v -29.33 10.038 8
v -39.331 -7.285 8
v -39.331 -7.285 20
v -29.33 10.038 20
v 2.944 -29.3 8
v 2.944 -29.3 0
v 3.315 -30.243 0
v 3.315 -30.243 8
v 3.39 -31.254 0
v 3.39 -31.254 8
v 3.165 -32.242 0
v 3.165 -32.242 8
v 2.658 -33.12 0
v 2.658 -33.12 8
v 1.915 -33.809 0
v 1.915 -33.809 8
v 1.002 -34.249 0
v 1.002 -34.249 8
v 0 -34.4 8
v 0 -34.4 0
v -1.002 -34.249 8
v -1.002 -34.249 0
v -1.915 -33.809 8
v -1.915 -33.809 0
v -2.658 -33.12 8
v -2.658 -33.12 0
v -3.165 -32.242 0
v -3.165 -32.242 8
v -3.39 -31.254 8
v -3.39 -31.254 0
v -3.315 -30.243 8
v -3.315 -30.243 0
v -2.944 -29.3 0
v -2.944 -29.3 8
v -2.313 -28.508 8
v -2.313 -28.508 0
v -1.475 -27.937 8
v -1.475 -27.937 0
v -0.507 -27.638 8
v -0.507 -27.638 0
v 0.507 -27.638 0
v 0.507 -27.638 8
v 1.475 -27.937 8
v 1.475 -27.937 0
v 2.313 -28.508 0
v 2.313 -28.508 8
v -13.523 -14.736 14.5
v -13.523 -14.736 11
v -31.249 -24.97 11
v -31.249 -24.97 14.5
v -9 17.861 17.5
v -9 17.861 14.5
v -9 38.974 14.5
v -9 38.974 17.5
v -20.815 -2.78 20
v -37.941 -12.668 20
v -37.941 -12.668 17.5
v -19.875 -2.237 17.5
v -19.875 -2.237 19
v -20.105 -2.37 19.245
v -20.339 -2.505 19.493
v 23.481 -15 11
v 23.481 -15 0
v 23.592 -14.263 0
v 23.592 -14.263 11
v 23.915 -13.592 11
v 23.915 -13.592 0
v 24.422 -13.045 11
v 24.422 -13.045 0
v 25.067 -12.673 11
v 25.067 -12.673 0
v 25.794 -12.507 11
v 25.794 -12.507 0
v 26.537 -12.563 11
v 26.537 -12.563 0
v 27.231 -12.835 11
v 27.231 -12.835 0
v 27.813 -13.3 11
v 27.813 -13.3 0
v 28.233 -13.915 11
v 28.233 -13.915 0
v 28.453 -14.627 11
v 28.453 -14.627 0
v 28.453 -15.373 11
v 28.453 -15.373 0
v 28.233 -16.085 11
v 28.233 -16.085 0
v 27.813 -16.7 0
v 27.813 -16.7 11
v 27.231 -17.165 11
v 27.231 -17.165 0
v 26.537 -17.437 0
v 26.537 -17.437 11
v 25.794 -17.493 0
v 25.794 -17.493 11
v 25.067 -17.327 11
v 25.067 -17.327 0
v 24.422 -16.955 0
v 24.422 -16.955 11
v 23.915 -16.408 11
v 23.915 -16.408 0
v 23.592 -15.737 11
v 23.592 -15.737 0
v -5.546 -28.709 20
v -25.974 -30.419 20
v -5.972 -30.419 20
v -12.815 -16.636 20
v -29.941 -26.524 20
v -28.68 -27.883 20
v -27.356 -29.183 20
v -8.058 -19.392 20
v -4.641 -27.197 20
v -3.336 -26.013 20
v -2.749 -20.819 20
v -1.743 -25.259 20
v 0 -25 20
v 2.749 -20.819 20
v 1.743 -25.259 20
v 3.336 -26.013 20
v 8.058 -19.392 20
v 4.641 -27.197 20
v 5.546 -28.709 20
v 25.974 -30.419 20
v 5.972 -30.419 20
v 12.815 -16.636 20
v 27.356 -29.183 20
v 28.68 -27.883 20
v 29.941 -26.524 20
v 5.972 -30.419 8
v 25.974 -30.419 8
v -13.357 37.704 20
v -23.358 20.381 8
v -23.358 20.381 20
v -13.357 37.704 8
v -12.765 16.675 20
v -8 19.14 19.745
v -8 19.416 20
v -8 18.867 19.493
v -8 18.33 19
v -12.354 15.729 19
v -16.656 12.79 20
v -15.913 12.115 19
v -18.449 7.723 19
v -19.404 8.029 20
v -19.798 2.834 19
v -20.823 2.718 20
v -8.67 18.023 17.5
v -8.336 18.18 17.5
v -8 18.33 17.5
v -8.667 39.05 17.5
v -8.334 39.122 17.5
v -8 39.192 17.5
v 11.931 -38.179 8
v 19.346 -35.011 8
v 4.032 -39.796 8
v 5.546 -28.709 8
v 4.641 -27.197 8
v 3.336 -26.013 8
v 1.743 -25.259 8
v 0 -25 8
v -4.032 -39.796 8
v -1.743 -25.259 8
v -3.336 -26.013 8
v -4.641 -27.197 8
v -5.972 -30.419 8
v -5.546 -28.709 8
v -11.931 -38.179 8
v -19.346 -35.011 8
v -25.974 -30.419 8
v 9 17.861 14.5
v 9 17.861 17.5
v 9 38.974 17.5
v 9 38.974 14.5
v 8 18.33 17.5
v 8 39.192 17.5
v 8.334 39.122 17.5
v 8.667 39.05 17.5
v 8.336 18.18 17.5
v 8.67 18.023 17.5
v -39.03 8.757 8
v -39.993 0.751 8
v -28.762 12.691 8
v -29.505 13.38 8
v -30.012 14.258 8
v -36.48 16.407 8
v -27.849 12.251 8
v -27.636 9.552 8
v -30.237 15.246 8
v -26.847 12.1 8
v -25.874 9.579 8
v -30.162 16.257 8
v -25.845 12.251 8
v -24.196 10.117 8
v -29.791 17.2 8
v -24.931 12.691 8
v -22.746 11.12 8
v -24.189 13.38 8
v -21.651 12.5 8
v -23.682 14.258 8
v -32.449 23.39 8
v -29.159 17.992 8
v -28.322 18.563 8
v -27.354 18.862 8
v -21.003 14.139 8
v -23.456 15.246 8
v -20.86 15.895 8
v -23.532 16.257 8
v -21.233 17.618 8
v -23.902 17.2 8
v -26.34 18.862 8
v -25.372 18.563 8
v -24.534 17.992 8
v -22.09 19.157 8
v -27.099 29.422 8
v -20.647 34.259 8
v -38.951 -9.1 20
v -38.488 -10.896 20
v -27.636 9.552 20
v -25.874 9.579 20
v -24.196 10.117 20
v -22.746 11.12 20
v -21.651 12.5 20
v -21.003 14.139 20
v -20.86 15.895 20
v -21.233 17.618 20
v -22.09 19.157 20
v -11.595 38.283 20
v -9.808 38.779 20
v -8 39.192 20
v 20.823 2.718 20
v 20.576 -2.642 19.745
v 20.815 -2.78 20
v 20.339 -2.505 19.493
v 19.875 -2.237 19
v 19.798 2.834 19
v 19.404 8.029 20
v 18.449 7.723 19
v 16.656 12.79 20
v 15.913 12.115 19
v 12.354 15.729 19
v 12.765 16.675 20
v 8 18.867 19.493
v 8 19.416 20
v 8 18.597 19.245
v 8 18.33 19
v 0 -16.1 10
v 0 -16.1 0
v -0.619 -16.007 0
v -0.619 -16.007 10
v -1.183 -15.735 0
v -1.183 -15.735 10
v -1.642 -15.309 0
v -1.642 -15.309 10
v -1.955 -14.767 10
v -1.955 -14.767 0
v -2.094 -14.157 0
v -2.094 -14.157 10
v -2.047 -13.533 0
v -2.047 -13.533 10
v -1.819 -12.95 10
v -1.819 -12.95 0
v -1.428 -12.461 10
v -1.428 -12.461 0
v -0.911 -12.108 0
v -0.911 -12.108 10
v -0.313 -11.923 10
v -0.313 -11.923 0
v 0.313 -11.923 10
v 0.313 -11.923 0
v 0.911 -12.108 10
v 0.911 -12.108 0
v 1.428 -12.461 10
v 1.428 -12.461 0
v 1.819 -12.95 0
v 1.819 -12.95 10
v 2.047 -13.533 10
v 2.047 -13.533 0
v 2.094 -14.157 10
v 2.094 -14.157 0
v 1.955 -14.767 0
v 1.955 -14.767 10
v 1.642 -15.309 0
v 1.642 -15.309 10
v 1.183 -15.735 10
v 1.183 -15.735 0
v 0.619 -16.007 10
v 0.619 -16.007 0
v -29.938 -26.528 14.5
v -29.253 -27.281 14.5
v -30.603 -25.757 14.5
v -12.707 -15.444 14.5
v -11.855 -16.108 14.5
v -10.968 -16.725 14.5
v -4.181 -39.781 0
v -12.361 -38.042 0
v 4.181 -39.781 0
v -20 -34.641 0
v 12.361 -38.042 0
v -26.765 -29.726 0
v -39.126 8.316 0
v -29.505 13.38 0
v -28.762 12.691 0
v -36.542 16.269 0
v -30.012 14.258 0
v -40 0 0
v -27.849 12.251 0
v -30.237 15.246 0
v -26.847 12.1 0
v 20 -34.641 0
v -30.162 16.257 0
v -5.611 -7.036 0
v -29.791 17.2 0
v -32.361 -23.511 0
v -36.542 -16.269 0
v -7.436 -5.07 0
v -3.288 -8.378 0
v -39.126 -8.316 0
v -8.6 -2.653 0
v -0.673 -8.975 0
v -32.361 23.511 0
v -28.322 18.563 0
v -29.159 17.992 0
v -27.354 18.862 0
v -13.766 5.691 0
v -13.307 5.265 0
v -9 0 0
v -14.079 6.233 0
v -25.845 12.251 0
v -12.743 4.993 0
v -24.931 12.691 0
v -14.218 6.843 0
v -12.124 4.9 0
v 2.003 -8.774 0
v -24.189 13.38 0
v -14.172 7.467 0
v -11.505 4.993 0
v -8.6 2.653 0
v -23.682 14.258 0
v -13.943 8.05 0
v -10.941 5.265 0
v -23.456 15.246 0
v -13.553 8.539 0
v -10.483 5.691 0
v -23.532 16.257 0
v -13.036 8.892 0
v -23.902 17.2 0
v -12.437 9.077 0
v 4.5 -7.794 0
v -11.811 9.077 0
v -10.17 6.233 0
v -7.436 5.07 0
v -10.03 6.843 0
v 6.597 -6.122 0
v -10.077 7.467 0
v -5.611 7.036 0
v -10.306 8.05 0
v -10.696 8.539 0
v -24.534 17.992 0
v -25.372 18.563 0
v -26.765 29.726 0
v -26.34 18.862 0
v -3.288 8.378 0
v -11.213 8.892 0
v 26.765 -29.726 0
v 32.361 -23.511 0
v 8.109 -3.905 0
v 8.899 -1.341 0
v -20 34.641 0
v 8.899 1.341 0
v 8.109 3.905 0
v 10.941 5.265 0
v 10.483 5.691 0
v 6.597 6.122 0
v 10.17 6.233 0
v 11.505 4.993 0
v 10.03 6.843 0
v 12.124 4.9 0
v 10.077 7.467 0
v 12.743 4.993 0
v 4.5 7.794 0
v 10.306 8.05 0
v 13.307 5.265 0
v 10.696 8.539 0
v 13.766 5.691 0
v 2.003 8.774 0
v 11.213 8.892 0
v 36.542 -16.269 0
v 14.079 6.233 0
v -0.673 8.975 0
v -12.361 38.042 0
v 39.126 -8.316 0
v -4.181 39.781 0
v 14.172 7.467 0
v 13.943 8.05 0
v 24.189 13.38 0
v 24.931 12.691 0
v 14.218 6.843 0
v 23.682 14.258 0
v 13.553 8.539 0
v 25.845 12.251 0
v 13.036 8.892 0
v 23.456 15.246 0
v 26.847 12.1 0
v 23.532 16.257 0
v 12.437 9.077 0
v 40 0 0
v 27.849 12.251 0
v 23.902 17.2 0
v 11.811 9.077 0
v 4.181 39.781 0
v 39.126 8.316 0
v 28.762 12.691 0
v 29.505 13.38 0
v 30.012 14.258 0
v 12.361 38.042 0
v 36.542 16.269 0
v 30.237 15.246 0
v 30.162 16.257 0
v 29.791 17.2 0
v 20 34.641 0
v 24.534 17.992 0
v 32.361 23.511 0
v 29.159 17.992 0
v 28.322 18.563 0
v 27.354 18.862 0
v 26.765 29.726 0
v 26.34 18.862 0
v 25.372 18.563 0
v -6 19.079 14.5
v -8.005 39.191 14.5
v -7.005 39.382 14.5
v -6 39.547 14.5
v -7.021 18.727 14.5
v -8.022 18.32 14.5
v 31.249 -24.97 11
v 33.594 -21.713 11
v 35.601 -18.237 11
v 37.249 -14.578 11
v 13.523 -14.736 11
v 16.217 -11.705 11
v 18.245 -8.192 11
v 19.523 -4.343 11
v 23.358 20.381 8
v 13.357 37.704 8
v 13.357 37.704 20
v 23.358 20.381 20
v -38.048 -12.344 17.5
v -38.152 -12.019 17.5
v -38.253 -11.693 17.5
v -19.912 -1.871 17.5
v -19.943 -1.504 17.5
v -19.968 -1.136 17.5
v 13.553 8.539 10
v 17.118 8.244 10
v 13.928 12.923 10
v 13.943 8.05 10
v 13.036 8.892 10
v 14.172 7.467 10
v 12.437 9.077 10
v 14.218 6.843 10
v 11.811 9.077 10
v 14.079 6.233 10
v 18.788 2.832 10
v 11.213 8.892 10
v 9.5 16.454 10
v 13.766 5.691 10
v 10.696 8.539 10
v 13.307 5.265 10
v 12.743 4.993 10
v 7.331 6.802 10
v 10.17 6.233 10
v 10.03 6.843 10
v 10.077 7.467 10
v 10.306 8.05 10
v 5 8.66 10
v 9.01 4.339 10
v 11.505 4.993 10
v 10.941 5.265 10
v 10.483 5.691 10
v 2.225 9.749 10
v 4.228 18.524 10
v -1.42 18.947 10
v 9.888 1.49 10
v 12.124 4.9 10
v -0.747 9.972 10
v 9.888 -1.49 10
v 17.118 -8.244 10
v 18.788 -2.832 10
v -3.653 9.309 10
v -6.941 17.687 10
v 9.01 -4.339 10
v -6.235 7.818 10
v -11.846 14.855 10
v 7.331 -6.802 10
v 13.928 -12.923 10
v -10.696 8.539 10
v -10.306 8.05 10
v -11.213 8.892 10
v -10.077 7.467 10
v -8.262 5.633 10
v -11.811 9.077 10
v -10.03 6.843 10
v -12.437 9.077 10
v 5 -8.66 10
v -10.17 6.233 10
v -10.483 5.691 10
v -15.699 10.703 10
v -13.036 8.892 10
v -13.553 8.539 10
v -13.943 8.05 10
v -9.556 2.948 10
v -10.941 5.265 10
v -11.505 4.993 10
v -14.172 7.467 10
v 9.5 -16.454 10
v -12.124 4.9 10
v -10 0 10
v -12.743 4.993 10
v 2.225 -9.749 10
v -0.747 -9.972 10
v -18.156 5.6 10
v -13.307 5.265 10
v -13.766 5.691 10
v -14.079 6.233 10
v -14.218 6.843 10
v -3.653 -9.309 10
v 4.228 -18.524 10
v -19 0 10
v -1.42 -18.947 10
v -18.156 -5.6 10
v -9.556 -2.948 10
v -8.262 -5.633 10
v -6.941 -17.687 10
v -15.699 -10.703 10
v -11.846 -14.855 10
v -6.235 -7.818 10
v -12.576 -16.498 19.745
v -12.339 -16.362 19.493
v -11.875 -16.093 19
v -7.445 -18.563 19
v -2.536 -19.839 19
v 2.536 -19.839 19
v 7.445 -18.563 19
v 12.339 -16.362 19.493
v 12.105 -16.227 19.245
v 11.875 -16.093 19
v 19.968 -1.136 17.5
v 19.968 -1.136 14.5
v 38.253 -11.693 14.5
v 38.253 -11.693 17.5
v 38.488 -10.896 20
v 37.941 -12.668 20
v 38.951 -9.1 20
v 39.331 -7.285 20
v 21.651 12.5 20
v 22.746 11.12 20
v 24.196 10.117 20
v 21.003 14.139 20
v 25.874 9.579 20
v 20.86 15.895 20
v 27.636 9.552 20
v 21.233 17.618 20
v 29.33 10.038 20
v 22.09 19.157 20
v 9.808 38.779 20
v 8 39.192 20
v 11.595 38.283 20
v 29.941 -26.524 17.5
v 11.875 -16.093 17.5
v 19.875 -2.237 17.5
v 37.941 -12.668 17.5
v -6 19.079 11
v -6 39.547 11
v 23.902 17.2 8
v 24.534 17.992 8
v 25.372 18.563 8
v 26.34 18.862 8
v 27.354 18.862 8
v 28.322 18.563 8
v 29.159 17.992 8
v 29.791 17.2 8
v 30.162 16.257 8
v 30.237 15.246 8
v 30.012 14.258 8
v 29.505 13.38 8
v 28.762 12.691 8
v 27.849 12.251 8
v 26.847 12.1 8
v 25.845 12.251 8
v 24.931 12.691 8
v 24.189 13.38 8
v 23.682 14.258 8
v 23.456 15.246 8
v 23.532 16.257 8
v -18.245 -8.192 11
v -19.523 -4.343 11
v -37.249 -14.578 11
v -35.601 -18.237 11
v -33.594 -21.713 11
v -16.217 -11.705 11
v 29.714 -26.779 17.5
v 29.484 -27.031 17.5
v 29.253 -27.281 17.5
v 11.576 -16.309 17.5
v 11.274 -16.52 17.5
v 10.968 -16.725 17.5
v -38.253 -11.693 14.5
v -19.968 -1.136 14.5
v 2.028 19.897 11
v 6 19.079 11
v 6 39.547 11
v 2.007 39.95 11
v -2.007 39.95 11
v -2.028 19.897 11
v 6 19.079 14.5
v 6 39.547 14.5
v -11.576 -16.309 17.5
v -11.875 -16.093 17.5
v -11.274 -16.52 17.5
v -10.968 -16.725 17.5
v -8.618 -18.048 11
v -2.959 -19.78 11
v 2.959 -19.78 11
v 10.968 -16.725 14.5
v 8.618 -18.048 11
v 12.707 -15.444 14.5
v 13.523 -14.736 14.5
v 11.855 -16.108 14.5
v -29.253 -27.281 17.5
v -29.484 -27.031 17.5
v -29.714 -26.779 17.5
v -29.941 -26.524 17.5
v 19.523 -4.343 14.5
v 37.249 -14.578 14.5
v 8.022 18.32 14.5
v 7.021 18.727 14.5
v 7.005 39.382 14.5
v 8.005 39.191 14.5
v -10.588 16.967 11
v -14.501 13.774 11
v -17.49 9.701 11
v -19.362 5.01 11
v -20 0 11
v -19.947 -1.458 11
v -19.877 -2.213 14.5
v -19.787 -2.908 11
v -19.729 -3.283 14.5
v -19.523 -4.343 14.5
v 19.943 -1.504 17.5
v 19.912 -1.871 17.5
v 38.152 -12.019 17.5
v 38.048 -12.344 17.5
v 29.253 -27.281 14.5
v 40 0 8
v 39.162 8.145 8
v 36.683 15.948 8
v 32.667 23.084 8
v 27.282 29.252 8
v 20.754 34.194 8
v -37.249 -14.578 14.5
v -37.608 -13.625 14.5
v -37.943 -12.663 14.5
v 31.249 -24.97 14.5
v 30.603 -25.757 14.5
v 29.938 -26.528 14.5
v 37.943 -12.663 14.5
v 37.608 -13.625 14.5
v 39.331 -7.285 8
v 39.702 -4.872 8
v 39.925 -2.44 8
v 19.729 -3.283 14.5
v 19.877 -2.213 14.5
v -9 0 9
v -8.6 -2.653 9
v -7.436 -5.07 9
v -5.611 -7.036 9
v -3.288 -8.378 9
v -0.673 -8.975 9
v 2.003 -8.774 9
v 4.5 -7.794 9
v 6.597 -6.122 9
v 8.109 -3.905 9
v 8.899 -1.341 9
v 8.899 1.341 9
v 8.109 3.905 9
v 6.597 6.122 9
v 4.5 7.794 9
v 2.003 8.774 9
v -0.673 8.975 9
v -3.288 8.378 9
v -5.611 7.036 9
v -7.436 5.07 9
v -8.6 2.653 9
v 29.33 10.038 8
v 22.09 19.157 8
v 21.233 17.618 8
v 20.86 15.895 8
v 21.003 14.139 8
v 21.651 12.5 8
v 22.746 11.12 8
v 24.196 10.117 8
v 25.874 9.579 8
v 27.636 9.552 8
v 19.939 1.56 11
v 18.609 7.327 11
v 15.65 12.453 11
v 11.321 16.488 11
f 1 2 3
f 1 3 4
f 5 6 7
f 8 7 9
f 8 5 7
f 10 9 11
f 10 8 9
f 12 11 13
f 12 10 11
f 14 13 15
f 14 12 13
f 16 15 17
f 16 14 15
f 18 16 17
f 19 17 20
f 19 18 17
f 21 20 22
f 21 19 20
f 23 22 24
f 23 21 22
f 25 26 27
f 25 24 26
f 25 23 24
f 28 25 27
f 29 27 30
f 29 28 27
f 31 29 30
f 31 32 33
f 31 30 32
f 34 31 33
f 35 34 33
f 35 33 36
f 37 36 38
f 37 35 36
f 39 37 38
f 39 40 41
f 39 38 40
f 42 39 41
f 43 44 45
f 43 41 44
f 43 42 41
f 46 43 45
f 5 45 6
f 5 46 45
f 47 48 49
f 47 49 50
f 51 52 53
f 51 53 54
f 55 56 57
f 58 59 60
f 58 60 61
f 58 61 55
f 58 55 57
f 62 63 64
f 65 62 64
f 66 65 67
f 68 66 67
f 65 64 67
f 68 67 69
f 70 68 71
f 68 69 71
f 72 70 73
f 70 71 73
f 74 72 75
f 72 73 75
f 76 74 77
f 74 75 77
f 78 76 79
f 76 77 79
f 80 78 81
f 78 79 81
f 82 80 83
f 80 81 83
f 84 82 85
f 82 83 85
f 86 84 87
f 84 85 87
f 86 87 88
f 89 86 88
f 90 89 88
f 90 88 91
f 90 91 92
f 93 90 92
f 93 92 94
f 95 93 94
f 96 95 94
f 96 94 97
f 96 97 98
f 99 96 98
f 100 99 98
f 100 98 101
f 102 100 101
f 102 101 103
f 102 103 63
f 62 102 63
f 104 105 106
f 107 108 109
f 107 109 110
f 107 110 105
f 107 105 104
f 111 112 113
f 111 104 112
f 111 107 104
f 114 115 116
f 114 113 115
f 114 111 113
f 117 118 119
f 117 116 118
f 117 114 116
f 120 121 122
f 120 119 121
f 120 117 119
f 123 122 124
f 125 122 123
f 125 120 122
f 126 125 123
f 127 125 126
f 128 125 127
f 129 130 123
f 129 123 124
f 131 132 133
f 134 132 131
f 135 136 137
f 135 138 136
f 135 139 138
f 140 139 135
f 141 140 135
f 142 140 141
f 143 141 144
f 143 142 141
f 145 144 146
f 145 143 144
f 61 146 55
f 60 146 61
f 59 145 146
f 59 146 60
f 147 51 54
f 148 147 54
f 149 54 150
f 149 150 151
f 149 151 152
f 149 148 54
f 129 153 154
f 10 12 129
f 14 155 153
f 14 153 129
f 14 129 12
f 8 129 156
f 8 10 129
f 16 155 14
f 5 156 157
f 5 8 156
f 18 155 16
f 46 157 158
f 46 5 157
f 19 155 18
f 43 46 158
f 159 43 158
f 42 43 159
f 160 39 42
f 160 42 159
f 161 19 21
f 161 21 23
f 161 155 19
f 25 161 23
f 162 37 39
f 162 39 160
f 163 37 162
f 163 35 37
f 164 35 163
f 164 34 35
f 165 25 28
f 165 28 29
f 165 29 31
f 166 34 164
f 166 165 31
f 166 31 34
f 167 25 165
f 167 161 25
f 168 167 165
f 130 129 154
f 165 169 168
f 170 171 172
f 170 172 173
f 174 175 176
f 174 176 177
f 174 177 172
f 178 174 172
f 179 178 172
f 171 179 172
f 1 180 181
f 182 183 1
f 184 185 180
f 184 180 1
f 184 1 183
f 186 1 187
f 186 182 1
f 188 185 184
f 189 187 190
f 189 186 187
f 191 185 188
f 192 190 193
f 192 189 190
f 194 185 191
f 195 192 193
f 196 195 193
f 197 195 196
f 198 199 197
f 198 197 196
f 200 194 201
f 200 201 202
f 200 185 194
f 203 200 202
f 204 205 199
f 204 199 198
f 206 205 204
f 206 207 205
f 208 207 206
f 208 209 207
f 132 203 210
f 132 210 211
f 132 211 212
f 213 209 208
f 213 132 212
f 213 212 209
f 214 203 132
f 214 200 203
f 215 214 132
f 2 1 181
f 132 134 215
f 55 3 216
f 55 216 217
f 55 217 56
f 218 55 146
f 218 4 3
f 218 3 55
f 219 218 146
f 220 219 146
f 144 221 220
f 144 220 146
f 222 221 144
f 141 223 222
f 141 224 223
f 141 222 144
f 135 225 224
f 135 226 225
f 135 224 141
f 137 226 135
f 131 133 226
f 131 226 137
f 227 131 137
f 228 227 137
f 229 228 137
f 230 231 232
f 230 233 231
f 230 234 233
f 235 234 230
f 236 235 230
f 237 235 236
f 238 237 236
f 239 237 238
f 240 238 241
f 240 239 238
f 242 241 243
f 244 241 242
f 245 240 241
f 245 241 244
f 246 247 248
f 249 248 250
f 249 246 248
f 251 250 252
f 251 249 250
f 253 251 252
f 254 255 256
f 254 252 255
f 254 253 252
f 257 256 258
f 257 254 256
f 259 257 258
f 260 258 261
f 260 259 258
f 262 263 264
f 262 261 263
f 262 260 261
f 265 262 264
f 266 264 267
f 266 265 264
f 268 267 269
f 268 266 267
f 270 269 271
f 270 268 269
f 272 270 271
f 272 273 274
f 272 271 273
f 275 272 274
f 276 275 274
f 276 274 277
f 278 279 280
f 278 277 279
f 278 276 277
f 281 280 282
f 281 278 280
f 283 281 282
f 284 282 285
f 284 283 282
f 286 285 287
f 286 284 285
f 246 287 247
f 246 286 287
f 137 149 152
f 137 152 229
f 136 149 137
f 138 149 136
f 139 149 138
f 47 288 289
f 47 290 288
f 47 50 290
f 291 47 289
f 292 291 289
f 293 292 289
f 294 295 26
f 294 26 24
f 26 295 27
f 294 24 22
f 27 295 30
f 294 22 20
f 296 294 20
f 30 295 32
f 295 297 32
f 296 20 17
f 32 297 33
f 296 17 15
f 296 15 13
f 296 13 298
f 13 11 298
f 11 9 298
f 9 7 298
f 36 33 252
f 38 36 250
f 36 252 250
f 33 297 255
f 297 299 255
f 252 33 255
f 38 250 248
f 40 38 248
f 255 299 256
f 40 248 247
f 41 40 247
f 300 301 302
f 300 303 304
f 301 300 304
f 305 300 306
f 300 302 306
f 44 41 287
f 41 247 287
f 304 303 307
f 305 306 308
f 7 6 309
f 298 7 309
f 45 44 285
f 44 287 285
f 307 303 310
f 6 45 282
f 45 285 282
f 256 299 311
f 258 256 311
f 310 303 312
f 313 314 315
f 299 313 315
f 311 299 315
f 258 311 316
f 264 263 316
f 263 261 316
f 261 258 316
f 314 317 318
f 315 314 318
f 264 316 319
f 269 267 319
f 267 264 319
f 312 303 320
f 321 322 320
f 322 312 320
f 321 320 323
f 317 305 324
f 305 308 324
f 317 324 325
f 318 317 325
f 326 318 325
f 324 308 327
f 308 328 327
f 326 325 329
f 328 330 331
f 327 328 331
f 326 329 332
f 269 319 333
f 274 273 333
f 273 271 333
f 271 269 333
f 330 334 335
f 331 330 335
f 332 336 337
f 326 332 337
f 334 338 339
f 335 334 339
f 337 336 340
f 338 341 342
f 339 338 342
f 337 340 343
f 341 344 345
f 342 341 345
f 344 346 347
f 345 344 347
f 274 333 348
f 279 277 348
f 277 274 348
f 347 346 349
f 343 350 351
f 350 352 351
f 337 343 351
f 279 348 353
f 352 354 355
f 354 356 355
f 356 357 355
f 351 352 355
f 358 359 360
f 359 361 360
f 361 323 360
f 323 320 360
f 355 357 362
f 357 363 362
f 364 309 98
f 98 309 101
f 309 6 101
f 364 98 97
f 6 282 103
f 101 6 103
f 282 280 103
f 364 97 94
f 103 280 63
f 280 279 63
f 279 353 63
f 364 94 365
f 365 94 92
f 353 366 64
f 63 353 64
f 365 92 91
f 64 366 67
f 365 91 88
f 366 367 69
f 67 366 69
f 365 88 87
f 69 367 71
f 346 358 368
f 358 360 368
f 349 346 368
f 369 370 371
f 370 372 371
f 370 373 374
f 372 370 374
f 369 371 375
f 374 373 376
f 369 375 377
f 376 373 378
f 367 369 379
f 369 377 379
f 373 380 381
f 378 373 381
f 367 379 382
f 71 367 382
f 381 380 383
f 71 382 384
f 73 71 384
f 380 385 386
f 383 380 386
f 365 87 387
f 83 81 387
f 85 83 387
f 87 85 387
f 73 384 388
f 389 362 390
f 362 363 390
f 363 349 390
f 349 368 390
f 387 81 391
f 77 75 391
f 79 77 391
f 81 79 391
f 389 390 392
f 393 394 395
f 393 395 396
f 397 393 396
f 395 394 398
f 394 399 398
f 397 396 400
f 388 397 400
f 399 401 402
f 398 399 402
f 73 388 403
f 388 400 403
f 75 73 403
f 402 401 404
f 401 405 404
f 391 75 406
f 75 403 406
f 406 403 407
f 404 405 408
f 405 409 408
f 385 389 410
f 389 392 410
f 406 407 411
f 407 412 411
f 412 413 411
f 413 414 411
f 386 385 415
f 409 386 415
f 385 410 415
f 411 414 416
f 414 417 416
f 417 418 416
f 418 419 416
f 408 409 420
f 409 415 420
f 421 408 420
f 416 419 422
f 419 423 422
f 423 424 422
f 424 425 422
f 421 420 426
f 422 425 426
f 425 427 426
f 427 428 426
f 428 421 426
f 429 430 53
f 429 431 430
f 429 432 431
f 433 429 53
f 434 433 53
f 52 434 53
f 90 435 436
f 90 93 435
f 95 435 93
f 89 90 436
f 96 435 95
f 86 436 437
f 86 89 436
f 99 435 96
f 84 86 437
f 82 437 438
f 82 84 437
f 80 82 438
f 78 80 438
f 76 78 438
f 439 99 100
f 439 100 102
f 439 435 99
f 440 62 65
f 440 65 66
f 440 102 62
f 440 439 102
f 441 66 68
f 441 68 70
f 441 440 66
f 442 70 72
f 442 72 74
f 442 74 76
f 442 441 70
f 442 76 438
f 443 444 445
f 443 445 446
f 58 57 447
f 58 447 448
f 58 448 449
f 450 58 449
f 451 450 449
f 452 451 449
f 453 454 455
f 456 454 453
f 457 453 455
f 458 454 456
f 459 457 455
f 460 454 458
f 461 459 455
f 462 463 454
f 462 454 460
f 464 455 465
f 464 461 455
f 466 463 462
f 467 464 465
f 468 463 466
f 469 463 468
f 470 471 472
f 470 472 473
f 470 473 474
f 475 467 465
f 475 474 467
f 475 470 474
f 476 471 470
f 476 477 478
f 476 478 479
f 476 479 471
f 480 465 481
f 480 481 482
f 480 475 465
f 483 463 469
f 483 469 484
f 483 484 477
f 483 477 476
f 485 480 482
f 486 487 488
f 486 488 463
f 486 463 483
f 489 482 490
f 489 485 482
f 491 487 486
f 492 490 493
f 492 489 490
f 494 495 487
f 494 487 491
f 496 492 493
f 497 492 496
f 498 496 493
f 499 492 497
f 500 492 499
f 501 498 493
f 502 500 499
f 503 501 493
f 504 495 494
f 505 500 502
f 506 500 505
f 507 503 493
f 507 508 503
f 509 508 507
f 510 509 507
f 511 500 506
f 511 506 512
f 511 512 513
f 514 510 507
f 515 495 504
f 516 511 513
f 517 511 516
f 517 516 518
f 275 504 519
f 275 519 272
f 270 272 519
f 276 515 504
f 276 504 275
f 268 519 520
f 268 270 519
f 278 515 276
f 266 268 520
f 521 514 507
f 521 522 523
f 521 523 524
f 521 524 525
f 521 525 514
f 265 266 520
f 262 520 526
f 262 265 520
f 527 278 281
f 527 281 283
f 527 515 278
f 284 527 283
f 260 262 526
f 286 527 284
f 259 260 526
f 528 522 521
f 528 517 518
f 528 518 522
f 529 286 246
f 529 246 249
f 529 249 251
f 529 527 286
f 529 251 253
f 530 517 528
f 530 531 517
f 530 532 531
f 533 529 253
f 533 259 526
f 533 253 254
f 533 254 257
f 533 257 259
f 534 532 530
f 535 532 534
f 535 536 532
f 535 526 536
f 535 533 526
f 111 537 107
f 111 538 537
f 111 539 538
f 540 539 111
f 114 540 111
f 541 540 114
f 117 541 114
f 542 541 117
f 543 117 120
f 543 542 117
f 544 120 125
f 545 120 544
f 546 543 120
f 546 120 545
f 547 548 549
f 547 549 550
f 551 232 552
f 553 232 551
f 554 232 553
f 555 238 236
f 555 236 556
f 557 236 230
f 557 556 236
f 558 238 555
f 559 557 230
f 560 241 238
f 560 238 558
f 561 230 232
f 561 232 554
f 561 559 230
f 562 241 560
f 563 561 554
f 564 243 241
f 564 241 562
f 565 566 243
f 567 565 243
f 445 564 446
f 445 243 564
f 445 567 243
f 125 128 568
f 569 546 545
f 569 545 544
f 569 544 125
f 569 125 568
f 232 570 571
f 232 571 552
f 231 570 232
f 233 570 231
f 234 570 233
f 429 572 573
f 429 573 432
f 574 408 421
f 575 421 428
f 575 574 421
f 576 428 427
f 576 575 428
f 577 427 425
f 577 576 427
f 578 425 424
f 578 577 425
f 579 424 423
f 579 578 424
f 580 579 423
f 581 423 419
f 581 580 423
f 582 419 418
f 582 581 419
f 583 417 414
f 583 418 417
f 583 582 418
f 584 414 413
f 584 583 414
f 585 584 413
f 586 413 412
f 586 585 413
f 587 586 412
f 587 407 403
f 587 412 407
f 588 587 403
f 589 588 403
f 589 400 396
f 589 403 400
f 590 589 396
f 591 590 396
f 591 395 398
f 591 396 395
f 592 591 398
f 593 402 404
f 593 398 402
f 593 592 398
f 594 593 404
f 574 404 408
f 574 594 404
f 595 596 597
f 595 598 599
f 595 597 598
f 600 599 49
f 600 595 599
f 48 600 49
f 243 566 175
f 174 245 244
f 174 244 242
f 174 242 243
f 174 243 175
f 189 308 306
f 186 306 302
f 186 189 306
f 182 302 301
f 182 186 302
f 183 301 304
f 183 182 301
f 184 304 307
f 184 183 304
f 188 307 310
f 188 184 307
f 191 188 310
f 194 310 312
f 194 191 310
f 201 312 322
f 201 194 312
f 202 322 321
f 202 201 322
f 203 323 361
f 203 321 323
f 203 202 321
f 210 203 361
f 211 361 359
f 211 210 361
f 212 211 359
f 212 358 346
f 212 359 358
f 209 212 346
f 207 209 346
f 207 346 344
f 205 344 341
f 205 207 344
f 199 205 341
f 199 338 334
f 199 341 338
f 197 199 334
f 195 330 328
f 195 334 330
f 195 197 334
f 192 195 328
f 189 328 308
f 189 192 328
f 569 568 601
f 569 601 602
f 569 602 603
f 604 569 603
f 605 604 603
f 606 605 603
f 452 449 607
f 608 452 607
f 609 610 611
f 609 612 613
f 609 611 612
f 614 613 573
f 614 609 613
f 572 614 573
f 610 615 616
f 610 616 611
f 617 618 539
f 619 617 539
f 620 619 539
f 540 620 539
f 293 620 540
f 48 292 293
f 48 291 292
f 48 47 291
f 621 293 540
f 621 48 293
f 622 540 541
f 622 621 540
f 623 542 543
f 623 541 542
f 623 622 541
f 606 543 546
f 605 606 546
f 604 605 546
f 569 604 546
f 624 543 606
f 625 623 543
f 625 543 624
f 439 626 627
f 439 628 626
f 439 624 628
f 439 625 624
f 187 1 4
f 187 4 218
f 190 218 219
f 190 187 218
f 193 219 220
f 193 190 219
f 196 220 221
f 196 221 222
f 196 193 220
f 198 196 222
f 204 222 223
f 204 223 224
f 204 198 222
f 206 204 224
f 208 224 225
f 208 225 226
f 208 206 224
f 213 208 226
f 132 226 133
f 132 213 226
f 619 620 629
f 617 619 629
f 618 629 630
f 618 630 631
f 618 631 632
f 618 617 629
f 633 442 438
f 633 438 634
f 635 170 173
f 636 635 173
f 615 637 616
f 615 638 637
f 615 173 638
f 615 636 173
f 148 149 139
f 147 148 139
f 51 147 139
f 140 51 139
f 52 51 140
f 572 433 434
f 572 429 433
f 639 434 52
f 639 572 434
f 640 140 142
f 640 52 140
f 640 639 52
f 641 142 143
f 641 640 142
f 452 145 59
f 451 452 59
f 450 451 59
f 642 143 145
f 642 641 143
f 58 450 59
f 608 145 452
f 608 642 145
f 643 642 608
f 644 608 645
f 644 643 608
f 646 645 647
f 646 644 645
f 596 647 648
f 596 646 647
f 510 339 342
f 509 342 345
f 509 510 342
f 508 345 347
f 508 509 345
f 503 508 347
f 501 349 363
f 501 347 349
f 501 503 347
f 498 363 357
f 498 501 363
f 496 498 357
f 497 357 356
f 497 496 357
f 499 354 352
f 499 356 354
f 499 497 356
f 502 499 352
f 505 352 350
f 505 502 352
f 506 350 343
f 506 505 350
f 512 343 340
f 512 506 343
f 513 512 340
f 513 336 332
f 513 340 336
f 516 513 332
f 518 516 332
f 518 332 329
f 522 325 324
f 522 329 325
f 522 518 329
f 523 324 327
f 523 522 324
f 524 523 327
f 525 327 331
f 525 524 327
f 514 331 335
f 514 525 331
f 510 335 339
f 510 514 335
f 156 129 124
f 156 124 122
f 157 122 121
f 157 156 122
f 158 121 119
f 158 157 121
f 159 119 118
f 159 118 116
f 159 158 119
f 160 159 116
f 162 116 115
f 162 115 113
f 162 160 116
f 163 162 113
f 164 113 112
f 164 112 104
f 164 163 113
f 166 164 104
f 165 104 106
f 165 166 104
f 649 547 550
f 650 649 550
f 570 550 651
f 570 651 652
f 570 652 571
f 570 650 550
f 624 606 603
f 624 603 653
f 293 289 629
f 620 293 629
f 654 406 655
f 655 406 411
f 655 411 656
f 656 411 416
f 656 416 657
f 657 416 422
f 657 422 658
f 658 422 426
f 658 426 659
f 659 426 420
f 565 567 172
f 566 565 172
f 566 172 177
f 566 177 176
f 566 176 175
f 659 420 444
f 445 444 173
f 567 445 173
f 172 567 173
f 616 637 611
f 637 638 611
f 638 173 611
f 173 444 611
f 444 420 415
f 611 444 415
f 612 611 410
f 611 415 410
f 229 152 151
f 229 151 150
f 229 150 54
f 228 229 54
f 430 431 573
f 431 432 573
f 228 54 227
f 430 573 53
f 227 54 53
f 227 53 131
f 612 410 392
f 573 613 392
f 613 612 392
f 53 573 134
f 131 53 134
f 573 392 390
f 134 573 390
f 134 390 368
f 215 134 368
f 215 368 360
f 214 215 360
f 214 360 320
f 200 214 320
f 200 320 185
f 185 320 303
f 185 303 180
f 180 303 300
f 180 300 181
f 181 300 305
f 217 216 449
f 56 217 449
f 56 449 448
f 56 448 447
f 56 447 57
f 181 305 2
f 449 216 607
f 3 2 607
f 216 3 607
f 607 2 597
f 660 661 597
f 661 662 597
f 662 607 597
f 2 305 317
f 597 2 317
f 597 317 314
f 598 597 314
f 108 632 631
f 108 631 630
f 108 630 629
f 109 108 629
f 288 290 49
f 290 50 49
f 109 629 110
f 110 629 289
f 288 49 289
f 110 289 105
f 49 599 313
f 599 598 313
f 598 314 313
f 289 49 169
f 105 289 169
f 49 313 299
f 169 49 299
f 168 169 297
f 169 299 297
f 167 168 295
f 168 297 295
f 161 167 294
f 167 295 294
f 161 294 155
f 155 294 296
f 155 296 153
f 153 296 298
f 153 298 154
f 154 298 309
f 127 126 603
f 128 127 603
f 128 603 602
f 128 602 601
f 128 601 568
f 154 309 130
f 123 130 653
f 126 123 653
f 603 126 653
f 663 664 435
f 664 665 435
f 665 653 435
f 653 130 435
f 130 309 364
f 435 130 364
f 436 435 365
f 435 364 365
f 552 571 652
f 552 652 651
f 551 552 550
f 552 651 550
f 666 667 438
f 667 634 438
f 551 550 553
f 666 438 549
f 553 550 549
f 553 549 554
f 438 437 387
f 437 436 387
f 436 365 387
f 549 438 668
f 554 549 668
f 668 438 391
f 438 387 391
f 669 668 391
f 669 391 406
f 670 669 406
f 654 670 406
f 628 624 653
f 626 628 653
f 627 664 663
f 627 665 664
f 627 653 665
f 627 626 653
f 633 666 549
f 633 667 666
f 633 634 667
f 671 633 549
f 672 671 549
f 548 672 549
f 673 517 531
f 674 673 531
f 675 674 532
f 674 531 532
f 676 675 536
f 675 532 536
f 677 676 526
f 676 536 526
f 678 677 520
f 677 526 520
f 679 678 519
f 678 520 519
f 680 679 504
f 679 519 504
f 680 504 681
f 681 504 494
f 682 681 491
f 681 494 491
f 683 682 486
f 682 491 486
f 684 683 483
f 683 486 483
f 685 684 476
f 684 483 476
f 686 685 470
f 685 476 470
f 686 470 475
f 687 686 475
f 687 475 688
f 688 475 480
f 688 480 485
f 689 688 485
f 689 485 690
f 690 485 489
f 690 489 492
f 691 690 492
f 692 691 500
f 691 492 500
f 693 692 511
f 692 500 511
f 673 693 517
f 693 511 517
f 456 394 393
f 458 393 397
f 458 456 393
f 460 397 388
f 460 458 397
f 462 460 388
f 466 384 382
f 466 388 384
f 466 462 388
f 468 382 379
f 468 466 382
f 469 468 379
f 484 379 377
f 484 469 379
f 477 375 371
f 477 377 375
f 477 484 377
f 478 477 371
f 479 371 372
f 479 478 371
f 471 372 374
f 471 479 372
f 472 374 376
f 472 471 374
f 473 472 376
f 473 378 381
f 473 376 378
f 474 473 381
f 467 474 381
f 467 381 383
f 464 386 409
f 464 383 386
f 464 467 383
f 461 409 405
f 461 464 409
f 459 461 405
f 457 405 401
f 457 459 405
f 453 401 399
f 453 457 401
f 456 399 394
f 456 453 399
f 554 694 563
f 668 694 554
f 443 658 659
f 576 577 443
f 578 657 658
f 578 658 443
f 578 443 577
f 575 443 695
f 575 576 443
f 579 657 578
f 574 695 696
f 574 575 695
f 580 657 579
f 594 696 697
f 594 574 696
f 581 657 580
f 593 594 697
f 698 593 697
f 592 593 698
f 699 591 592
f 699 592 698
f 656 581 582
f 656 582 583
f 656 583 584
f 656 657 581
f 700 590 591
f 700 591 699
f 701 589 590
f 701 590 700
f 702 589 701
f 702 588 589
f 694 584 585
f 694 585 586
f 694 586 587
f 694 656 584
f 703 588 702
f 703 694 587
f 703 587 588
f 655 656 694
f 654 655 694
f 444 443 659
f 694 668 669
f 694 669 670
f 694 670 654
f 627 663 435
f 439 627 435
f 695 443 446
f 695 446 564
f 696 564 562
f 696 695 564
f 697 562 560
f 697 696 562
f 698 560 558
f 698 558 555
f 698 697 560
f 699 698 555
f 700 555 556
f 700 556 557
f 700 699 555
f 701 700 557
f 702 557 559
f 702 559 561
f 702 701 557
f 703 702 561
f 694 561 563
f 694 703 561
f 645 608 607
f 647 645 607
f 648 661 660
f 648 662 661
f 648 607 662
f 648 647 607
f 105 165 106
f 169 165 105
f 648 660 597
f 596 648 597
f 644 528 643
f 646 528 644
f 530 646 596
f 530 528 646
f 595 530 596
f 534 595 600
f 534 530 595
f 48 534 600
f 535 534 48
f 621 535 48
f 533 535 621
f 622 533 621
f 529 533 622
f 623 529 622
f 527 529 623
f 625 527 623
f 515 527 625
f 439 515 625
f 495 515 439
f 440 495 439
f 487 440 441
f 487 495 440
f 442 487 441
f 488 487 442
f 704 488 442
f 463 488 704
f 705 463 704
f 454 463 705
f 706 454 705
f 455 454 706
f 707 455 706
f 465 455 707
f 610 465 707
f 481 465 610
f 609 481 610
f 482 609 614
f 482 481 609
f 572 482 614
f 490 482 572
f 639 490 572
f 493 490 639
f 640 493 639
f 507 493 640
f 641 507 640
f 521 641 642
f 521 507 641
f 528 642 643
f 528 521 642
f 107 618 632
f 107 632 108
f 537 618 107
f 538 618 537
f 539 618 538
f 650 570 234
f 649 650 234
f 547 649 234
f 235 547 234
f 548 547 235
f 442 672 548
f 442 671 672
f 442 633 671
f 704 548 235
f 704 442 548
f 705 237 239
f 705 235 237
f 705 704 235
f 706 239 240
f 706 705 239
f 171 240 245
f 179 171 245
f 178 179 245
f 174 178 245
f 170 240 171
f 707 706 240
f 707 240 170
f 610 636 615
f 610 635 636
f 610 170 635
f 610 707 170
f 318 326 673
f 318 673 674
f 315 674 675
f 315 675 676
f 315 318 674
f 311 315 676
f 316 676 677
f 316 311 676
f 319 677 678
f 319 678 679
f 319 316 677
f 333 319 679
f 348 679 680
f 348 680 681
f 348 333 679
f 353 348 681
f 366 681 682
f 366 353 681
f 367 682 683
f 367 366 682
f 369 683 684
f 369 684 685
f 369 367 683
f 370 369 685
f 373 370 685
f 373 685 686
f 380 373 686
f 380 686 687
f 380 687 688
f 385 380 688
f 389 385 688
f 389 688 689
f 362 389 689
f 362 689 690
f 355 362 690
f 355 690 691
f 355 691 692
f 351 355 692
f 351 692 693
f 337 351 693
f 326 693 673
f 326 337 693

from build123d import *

# Parameters (mm, degrees)
SKETCH1_R               = 40
BOSS_EXTRUDE1_DEPTH     = 20
CUT_EXTRUDE1_START      = -12
CUT_EXTRUDE1_DEPTH      = 12
CIRPATTERN1_COUNT       = 3
CIRPATTERN2_COUNT       = 3
CIRPATTERN3_COUNT       = 3
M6_TAPPED_HOLE2_D       = 5
CHAMFER1_SIZE           = 1
CUT_EXTRUDE2_REACH      = 62
CUT_EXTRUDE2_END_RADIUS = 40
CIRPATTERN4_COUNT       = 3
CHAMFER2_SIZE           = 1


with BuildPart() as part:
    # Sketch1 → Boss-Extrude1 (new body)
    with BuildSketch(Plane.XY):
        Circle(SKETCH1_R)
    extrude(amount=BOSS_EXTRUDE1_DEPTH)

    # Sketch2 → Cut-Extrude1 (cut)
    with BuildSketch(Plane.XY.offset(20).offset(CUT_EXTRUDE1_START)):
        with BuildLine():
            Line((-39.331070493, -7.284702732), (-29.329853145, 10.037913852))
            ThreePointArc((-29.329853145, 10.037913852), (-21.650635095, 12.5), (-23.358014969, 20.381440987))
            Line((-23.358014969, 20.381440987), (-13.356797621, 37.704057571))
            ThreePointArc((-13.356797621, 37.704057571), (-34.641016151, 20), (-39.331070493, -7.284702732))
        make_face()
    cut_extrude1 = extrude(amount=CUT_EXTRUDE1_DEPTH, mode=Mode.SUBTRACT)

    # CirPattern1: Cut-Extrude1 ×3 about axis
    cirpattern1_axis = Axis((0, 0, 0), (0, 0, 1))
    for i in range(1, CIRPATTERN1_COUNT):
        add(cut_extrude1.rotate(cirpattern1_axis, i * 360 / CIRPATTERN1_COUNT), mode=Mode.SUBTRACT)

    # Sketch3 → Cut-Revolve1 (revolve, cut)
    with BuildSketch(Plane(origin=(0, 0, 0), x_dir=(0, 0, -1), z_dir=(1, 0, 0)), mode=Mode.PRIVATE) as cut_revolve1_sk:
        Polygon((-20, 0), (-20, 20), (-10, 20), (-10, 9), (0, 9), (0, 0), align=None)
    revolve(cut_revolve1_sk.sketch.rotate(Axis((0, 0, 0), (0, 0, 1)), 90), axis=Axis((0, 0, 0), (0, 0, 1)), mode=Mode.SUBTRACT)

    # Sketch7 → M5 Tapped Hole1 (revolve, cut)
    with BuildSketch(Plane(origin=(0, -14, 10), x_dir=(0, -1, 0), z_dir=(1, 0, 0))):
        Polygon((0, 0), (0, 14), (2.1, 12.7381927), (2.1, 0), align=None)
    m5_tapped_hole1 = revolve(axis=Axis((0, -14, 16.35), (0, 0, -1)), mode=Mode.SUBTRACT)

    # CirPattern2: M5 Tapped Hole1 ×3 about axis
    cirpattern2_axis = Axis((0, 0, 0), (0, 0, 1))
    for i in range(1, CIRPATTERN2_COUNT):
        add(m5_tapped_hole1.rotate(cirpattern2_axis, i * 360 / CIRPATTERN2_COUNT), mode=Mode.SUBTRACT)

    # Sketch9 → M8 Tapped Hole1 (revolve, cut)
    with BuildSketch(Plane(origin=(-26.846787517, 15.5, 8), x_dir=(0, -1, 0), z_dir=(1, 0, 0))):
        Polygon((0, 0), (0, 22.25), (3.4, 20.207073895), (3.4, 0), align=None)
    m8_tapped_hole1 = revolve(axis=Axis((-26.846787517, 15.5, 14.35), (0, 0, -1)), mode=Mode.SUBTRACT)

    # CirPattern3: M8 Tapped Hole1 ×3 about axis
    cirpattern3_axis = Axis((0, 0, 0), (0, 0, 1))
    for i in range(1, CIRPATTERN3_COUNT):
        add(m8_tapped_hole1.rotate(cirpattern3_axis, i * 360 / CIRPATTERN3_COUNT), mode=Mode.SUBTRACT)

    # M6 Tapped Hole2 (through all)
    with Locations(Plane.XY.offset(20)):
        with Locations((25.980762114, -15)):
            Hole(M6_TAPPED_HOLE2_D / 2)

    # Chamfer1
    chamfer1_edges = [part.edges().sort_by_distance(p)[0] for p in [
        (20, 0, 20),
        (20, 0, 10),
    ]]
    chamfer(chamfer1_edges, length=CHAMFER1_SIZE)

    # Cut-Extrude2: up to this cylinder (the profile starts inside it)
    cut_extrude2_end = Plane(origin=(0, 0, 15.805147), z_dir=(0, 0, -1)) * Cylinder(CUT_EXTRUDE2_END_RADIUS, 205, mode=Mode.PRIVATE)
    # Sketch12 → Cut-Extrude2 (cut, up to the surface)
    with BuildSketch(Plane(origin=(0, 0, 0), x_dir=(1, 0, 0), z_dir=(0, 1, 0)), mode=Mode.PRIVATE) as cut_extrude2_sk1:
        Polygon((8, -20), (8, -17.5), (9, -17.5), (9, -14.5), (6, -14.5), (6, -11), (-6, -11), (-6, -14.5), (-9, -14.5), (-9, -17.5), (-8, -17.5), (-8, -20), align=None)
    cut_extrude2_tool1 = extrude(cut_extrude2_sk1.sketch, amount=CUT_EXTRUDE2_REACH, mode=Mode.PRIVATE) & cut_extrude2_end
    cut_extrude2 = cut_extrude2_tool1.solids().sort_by_distance((0, 0, 15.805147))[0]
    add(cut_extrude2, mode=Mode.SUBTRACT)

    # CirPattern4: Cut-Extrude2 ×3 about axis
    cirpattern4_axis = Axis((0, 0, 0), (0, 0, 1))
    for i in range(1, CIRPATTERN4_COUNT):
        add(cut_extrude2.rotate(cirpattern4_axis, i * 360 / CIRPATTERN4_COUNT), mode=Mode.SUBTRACT)

    # Chamfer2
    chamfer2_edges = [part.edges().sort_by_distance(p)[0] for p in [
        (9, 0, 10),
    ]]
    chamfer(chamfer2_edges, length=CHAMFER2_SIZE)


solid = part.part
